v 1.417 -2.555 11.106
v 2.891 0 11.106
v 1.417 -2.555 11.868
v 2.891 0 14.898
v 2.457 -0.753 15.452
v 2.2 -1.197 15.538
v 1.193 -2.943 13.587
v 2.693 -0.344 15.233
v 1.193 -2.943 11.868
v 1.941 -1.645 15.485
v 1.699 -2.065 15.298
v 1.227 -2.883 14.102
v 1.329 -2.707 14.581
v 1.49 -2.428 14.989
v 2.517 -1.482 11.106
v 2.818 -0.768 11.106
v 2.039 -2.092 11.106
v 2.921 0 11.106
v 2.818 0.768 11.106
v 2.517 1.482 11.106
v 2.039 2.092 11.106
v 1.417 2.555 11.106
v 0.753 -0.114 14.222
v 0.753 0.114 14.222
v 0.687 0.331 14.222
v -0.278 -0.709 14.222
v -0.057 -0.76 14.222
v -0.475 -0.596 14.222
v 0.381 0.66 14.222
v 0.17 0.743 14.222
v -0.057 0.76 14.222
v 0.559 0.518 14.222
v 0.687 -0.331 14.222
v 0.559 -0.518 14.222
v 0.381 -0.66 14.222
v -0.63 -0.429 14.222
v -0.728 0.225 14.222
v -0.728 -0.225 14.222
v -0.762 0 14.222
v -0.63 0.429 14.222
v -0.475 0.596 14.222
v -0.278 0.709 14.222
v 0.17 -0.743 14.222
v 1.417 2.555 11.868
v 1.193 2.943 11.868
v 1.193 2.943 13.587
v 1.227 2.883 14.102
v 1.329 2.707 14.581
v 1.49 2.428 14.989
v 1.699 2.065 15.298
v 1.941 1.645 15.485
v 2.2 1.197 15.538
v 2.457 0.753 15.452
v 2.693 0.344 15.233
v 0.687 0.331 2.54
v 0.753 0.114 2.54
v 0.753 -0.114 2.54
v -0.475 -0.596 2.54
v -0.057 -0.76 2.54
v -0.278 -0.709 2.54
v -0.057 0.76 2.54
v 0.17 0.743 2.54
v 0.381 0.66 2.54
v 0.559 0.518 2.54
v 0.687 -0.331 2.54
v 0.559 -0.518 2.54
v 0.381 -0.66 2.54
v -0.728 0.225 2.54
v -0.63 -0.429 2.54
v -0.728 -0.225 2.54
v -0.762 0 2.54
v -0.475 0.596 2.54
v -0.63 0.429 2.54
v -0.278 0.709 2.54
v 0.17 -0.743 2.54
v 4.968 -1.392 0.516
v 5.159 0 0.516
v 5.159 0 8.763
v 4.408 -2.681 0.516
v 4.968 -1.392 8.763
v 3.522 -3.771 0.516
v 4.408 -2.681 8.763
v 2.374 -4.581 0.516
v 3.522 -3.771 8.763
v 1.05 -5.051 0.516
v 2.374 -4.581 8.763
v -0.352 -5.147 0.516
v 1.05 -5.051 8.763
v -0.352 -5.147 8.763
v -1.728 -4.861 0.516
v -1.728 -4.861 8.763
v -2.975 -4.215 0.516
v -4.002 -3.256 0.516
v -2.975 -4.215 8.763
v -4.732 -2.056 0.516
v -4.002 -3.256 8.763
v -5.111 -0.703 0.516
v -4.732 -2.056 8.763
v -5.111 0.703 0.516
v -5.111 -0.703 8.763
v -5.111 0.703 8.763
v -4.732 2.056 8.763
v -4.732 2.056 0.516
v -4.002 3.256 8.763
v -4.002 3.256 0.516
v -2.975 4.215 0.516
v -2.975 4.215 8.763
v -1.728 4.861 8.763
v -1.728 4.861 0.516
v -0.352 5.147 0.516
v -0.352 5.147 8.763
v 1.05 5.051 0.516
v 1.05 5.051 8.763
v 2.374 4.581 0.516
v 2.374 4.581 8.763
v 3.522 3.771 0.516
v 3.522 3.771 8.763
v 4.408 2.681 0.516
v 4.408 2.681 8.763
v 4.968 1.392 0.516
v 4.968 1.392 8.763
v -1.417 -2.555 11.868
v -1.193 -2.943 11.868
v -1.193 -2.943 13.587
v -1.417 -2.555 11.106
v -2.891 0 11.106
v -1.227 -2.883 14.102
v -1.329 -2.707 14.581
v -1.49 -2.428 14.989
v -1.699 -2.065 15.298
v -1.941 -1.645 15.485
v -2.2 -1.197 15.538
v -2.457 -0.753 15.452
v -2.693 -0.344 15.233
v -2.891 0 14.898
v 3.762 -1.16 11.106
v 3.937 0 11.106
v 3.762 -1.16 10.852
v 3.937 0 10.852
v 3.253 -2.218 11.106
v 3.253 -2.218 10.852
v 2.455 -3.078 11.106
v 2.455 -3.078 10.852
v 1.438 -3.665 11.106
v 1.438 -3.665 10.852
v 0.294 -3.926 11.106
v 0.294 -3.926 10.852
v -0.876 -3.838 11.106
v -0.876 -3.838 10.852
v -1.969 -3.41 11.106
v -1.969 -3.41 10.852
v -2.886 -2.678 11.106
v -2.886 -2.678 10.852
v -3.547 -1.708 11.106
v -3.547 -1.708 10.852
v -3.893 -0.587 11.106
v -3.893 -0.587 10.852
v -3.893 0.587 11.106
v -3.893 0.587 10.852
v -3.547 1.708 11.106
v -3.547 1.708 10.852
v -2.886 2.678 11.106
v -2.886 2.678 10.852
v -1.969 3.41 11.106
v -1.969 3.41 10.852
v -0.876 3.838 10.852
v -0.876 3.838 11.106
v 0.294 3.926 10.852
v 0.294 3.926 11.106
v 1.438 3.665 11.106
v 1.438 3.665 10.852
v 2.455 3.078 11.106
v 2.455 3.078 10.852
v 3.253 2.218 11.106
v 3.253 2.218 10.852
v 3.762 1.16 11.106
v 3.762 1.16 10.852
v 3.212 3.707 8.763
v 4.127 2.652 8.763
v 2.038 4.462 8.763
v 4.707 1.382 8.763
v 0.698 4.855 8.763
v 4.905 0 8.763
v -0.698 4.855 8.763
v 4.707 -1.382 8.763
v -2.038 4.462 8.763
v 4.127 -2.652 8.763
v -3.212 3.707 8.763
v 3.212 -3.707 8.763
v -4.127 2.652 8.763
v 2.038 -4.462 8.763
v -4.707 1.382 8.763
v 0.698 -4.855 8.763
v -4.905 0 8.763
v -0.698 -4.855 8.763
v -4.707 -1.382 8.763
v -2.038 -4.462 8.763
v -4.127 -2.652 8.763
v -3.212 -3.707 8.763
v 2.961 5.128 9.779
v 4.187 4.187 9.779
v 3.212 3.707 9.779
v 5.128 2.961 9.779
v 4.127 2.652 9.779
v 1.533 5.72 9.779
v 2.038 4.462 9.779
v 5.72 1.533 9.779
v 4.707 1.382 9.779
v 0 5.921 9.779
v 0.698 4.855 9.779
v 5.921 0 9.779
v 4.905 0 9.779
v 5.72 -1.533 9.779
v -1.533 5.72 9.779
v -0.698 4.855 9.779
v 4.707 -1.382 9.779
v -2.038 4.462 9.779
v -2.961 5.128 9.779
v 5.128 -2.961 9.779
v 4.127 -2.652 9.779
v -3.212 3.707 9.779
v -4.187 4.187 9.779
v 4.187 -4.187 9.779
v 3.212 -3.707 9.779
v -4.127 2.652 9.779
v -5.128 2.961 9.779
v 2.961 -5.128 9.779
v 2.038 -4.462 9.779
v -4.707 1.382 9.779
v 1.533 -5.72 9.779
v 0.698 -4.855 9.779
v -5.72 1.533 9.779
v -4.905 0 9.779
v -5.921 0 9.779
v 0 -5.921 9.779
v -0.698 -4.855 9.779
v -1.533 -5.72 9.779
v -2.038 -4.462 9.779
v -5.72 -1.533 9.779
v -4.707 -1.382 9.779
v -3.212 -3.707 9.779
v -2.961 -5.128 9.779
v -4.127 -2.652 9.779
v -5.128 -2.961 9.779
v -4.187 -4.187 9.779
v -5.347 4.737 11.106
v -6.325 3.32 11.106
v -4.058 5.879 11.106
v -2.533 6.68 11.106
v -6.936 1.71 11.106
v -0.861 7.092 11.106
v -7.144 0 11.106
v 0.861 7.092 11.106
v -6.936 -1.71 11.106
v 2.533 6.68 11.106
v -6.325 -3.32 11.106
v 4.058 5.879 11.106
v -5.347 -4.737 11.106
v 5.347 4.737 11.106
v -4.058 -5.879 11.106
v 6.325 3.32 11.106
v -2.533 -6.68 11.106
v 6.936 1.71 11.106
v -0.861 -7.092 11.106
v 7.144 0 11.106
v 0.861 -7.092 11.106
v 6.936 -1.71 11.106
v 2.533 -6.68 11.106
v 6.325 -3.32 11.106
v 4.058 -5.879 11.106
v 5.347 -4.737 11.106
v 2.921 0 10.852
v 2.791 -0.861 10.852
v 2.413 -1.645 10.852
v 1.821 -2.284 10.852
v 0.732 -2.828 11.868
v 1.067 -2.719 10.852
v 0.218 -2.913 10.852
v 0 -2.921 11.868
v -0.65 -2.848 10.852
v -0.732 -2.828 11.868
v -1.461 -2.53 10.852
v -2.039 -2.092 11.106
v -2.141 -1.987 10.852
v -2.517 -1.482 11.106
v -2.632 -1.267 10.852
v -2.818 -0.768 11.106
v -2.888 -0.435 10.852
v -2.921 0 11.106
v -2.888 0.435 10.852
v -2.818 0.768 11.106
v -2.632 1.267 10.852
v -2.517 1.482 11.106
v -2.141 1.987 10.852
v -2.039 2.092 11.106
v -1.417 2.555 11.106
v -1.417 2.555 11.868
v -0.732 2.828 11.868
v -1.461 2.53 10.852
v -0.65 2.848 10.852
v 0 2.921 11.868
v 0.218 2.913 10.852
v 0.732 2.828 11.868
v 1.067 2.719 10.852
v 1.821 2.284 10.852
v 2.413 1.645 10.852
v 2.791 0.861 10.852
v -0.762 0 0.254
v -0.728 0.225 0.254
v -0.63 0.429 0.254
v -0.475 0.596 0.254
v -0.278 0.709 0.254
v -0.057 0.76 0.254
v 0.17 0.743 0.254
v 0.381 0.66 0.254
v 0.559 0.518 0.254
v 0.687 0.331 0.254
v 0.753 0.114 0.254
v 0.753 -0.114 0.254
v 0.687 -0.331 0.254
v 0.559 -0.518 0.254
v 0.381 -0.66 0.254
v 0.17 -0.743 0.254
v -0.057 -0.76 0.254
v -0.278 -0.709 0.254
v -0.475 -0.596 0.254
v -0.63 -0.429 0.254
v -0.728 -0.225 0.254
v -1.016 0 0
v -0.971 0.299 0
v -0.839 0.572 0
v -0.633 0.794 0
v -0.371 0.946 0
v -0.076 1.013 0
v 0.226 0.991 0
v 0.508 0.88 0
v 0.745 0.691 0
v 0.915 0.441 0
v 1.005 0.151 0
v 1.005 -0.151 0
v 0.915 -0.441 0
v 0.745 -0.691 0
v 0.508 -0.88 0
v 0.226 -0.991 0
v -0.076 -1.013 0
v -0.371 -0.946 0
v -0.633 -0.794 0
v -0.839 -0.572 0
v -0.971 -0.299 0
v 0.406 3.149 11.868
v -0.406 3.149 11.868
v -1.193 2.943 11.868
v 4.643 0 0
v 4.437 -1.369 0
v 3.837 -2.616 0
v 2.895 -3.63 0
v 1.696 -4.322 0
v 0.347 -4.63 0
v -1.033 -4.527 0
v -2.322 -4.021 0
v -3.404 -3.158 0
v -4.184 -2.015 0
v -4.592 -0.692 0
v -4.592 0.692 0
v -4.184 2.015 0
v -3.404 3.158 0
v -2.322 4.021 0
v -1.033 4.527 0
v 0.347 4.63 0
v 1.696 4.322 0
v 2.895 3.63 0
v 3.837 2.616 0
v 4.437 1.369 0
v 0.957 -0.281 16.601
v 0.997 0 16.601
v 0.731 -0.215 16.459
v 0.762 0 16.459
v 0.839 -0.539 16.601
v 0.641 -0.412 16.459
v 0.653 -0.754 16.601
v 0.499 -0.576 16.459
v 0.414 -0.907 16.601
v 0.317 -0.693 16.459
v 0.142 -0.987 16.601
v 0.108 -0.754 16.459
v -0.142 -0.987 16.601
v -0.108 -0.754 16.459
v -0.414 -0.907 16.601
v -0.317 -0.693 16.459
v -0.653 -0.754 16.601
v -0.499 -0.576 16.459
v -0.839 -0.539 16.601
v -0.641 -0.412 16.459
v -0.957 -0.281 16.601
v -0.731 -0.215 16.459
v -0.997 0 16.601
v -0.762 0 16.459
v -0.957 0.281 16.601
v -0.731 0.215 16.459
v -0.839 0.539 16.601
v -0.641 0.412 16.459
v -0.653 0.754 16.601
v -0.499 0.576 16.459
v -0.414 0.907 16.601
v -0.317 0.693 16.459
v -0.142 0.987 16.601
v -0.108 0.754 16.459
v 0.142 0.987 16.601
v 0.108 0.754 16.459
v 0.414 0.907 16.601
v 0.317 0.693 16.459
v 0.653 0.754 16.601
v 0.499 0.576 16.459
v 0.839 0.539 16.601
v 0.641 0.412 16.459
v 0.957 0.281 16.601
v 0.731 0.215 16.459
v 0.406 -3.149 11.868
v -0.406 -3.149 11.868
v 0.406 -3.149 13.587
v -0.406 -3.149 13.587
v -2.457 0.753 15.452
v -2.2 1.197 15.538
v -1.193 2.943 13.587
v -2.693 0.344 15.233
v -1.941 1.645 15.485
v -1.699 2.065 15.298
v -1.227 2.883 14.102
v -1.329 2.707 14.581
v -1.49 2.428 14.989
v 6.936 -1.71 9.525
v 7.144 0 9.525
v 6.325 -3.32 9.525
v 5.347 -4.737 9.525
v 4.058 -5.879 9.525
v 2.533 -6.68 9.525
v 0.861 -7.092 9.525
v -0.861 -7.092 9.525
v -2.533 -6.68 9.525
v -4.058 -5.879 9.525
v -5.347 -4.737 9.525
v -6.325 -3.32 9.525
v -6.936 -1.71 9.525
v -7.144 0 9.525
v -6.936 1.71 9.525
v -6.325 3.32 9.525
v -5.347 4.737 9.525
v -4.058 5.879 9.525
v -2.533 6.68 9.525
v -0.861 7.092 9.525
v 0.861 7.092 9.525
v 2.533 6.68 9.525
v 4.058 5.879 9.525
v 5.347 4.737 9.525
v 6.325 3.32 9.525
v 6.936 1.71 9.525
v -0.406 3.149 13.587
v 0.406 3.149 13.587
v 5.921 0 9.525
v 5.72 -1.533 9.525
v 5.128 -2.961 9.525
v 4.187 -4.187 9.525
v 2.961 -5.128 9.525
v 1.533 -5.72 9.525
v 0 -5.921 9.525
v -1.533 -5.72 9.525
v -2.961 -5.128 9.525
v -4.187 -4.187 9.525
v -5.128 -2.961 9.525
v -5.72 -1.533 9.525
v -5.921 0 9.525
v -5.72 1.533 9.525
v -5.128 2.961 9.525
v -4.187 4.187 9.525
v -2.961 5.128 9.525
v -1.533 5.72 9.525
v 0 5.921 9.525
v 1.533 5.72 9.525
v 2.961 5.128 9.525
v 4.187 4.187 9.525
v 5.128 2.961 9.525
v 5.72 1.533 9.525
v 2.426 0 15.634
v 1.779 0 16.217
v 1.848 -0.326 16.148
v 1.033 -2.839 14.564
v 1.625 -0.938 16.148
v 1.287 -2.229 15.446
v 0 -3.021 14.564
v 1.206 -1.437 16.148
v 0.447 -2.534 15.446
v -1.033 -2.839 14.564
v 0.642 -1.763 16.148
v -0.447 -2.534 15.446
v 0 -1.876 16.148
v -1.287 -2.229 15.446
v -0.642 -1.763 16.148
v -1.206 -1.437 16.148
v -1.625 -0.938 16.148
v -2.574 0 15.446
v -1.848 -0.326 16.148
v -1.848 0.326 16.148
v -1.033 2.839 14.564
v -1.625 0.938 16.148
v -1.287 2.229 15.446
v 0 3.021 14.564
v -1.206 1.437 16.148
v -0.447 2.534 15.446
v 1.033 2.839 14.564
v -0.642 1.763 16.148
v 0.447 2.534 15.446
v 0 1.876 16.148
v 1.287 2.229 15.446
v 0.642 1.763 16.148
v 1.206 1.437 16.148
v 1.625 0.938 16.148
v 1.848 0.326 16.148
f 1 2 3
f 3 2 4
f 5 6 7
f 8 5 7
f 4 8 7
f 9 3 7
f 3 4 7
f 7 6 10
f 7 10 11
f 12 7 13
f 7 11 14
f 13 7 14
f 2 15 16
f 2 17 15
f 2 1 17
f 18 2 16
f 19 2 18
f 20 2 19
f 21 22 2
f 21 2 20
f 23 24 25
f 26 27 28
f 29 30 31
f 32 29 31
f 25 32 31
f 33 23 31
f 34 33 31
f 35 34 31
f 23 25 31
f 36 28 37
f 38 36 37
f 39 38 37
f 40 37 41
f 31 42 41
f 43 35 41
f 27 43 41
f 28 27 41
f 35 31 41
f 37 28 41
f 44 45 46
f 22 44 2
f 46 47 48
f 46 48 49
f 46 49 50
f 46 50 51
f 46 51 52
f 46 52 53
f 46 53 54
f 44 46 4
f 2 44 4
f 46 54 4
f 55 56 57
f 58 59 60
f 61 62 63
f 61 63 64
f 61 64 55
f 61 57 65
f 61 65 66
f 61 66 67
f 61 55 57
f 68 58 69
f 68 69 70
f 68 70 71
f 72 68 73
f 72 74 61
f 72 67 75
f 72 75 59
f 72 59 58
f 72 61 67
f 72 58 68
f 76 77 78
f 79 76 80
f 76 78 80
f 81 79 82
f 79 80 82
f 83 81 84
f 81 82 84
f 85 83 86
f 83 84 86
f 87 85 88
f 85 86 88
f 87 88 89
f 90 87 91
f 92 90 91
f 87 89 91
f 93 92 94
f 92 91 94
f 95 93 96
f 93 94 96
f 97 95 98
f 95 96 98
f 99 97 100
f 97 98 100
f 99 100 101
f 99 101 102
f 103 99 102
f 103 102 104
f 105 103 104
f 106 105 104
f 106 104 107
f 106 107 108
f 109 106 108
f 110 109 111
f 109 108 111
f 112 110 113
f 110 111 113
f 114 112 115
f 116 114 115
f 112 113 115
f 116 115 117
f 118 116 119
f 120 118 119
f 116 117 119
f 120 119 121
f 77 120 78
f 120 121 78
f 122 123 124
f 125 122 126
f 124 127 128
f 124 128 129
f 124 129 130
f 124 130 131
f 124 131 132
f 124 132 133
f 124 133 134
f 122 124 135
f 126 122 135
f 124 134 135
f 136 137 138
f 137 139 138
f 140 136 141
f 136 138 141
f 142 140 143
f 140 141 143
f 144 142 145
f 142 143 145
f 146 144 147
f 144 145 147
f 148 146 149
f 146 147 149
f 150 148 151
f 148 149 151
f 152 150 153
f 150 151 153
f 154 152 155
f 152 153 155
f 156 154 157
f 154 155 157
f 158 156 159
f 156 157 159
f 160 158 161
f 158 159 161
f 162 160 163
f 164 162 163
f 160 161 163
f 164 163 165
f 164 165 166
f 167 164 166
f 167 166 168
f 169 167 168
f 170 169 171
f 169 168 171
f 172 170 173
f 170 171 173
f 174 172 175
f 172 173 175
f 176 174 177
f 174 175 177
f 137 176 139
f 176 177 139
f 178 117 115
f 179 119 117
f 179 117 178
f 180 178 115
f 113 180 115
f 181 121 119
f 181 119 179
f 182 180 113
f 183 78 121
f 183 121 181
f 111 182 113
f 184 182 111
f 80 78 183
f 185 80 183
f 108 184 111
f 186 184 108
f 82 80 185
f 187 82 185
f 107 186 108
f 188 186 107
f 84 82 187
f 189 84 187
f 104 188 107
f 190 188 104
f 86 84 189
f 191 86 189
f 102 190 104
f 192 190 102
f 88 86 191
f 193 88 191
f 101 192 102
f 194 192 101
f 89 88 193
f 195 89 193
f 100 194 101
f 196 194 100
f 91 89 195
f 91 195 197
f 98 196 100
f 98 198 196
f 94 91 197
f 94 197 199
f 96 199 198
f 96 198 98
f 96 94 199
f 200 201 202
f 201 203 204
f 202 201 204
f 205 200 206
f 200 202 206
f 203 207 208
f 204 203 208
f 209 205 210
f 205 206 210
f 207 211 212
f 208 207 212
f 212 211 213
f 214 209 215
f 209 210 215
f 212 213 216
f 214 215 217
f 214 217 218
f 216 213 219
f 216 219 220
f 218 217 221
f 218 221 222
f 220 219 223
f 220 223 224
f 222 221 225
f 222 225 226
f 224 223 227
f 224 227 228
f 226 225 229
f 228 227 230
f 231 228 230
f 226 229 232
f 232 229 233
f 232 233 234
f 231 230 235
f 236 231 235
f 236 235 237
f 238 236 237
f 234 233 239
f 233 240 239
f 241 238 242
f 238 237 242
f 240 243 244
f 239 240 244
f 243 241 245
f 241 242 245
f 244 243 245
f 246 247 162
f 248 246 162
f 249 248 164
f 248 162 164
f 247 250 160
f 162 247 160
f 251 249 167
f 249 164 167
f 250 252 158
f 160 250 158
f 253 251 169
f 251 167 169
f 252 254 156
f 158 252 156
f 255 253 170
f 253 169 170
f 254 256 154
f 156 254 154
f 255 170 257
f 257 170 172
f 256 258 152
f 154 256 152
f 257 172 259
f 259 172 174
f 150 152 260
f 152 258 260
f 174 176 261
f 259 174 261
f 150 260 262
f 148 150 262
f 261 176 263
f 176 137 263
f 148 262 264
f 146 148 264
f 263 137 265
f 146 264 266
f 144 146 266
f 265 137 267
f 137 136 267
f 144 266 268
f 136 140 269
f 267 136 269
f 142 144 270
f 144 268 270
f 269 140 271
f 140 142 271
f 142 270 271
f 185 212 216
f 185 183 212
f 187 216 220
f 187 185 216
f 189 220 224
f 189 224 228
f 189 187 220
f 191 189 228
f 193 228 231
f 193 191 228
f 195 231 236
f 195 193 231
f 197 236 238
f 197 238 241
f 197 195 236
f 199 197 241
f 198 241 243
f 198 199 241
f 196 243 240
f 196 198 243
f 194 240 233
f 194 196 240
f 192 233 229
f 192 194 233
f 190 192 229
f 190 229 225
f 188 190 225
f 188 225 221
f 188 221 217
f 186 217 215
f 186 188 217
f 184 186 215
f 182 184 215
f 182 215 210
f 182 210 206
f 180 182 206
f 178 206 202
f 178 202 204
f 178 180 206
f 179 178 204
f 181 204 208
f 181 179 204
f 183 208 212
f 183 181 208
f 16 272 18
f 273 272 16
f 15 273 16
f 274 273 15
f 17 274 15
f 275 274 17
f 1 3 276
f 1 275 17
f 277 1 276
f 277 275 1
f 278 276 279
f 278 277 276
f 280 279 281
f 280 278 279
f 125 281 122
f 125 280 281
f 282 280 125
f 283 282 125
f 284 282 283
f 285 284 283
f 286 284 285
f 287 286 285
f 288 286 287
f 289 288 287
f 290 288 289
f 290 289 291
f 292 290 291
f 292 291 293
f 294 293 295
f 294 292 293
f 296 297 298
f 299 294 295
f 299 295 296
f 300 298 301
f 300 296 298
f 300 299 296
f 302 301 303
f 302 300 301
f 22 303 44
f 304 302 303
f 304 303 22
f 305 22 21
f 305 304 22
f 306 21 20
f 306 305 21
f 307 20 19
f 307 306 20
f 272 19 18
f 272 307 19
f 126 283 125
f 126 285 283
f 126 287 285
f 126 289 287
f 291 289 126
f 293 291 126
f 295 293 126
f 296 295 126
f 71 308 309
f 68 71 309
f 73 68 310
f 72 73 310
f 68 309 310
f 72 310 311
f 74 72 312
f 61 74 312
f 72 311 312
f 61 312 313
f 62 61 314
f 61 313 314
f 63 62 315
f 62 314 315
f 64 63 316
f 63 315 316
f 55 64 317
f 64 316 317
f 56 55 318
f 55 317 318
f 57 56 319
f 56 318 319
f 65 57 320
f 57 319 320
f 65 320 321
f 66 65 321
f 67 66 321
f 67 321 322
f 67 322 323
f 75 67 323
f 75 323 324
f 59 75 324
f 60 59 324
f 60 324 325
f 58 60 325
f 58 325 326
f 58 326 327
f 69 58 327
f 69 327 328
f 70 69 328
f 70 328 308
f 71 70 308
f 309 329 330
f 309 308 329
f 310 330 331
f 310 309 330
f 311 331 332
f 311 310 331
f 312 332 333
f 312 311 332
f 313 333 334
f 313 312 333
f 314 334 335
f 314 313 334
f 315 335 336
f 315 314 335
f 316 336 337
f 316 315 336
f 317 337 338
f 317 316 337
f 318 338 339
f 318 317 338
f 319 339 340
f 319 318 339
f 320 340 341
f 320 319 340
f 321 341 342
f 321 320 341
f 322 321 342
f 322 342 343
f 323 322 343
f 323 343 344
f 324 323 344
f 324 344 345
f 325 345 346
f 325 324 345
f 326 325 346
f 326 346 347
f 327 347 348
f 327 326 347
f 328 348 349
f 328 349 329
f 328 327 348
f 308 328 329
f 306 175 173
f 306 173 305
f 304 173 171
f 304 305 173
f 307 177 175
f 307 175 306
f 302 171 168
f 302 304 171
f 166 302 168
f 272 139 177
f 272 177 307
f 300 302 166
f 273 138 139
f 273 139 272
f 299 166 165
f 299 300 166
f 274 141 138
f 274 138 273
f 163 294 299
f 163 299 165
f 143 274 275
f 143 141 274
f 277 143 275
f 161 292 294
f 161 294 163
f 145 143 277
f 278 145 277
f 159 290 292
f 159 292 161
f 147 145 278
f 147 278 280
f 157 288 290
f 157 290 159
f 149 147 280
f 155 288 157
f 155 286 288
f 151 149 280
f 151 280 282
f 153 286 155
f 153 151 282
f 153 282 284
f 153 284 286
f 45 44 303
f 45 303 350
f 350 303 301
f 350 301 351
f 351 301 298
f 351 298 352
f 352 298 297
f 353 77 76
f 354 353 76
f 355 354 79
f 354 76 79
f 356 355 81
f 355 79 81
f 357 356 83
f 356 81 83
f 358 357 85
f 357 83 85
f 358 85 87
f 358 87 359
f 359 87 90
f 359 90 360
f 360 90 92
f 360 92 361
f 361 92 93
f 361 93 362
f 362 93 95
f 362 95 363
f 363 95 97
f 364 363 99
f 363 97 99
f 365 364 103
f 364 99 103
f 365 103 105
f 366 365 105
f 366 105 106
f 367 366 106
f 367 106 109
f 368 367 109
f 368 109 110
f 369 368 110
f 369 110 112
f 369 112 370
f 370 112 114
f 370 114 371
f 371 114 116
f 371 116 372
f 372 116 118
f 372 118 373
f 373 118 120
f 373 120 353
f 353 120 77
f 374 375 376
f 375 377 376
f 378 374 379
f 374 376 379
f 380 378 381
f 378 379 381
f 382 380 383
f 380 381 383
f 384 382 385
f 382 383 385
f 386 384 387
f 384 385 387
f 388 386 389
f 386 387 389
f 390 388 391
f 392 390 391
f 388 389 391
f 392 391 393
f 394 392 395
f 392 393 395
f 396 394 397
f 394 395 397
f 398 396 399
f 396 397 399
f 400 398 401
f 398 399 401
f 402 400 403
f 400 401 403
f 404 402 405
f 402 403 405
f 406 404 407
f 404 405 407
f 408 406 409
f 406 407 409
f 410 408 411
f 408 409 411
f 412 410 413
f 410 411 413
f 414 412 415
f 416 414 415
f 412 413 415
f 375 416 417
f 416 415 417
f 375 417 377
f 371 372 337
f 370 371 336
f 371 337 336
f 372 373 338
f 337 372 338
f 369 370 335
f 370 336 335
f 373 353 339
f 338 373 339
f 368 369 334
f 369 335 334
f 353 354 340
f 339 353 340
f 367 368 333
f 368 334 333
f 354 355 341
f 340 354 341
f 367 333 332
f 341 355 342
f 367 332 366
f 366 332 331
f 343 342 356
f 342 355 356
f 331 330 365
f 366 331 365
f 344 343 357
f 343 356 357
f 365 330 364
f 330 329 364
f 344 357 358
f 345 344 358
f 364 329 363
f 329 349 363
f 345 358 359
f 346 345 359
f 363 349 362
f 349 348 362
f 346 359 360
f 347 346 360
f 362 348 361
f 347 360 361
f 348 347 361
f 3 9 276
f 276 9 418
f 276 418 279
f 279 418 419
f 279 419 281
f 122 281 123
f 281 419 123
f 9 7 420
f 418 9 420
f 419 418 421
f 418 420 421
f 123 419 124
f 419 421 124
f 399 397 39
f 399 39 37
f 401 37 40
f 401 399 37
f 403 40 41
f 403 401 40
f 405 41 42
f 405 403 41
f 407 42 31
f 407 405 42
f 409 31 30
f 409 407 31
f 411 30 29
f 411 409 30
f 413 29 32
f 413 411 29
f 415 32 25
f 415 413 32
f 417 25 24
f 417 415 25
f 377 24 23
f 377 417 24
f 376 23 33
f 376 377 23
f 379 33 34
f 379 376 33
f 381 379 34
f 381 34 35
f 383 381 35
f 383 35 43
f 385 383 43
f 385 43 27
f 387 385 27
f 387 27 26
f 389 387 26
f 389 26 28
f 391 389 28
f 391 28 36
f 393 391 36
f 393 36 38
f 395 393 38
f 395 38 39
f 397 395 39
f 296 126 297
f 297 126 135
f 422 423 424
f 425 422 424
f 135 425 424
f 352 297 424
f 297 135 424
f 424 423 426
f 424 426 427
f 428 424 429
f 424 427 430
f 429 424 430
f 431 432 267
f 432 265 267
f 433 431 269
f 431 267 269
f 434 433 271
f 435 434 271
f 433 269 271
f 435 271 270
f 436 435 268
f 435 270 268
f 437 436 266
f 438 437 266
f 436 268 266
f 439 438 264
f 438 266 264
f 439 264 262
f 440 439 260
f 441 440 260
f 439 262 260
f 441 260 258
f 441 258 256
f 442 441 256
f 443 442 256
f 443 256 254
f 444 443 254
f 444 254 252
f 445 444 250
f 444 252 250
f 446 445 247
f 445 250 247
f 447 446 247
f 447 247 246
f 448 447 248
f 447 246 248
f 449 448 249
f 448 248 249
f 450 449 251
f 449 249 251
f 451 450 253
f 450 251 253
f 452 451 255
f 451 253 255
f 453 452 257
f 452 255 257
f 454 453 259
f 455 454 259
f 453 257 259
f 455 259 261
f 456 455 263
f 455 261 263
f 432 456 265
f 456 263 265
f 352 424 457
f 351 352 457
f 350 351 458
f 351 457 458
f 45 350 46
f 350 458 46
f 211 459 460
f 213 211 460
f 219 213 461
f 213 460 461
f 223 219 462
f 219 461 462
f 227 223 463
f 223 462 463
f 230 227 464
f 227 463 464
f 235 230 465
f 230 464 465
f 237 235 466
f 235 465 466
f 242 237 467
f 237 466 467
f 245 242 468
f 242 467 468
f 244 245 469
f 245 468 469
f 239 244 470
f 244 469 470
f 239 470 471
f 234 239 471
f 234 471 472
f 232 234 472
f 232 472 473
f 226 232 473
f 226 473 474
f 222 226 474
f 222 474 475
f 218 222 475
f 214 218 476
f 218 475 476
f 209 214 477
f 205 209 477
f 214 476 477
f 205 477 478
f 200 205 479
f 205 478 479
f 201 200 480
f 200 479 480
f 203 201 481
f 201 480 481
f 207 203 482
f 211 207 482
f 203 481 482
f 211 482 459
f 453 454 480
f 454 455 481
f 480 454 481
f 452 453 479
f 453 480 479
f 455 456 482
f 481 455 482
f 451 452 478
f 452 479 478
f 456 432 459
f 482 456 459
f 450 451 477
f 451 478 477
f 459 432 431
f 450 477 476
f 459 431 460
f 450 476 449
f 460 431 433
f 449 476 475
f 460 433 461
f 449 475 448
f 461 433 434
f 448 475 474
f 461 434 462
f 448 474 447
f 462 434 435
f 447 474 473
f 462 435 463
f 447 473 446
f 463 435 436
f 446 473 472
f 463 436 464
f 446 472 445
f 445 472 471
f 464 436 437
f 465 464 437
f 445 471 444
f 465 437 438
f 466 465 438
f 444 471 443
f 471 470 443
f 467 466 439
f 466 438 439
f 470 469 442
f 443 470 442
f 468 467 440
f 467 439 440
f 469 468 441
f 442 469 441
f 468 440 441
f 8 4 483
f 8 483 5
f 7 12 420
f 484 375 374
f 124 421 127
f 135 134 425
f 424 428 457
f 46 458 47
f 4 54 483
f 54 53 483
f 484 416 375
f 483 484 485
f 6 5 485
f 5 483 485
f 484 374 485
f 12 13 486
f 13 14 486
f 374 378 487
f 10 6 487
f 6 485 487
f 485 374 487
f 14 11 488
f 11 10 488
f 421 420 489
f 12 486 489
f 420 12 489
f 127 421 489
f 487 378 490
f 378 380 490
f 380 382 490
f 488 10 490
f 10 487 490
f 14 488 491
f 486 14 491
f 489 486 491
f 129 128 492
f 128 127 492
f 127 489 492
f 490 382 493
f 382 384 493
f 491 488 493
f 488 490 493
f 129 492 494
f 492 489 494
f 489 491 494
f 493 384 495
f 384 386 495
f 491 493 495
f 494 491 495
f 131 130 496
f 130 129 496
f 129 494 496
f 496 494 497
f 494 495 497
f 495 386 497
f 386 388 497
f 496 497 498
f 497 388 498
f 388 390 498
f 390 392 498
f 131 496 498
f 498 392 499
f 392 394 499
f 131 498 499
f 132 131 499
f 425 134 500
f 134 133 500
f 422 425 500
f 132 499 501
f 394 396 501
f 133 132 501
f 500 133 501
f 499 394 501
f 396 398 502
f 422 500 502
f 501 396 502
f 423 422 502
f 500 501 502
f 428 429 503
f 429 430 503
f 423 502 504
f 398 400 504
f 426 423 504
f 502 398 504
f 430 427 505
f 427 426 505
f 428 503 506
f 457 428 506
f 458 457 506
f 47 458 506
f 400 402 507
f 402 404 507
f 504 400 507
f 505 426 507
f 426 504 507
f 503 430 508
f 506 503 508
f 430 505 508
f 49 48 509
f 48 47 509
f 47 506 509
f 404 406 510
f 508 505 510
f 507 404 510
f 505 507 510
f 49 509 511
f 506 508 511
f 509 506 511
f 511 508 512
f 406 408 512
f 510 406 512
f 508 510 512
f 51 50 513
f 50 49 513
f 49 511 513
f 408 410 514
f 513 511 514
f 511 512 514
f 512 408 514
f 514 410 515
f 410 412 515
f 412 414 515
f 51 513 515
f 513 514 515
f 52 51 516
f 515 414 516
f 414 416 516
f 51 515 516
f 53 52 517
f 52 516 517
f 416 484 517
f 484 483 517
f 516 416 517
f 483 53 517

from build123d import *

# Parameters (mm, degrees)
SKETCH3_W          = 1.016
SKETCH3_H          = 1.016
CHAMFER1_SIZE      = 0.5159375
SKETCH2_R          = 0.762
CUT_EXTRUDE1_DEPTH = 2.54
CHAMFER2_SIZE      = 0.254
CHAMFER2_SIZE_2    = 0.209783356
SKETCH4_OUTSIDE_W  = 21.518
SKETCH4_OUTSIDE_H  = 21.518
CUT_EXTRUDE2_DEPTH = 5.655396081


with BuildPart() as part:
    # Sketch1 → Revolve1 (revolve)
    with BuildSketch(Plane(origin=(0, 0, 0), x_dir=(0, 0, -1), z_dir=(1, 0, 0)), mode=Mode.PRIVATE) as revolve1_sk:
        with BuildLine():
            Line((0, 0), (0, 5.159375))
            Line((0, 5.159375), (-9.525, 5.159375))
            Line((-9.525, 5.159375), (-9.525, 7.14375))
            Line((-9.525, 7.14375), (-11.10615, 7.14375))
            Line((-11.10615, 7.14375), (-11.10615, 3.175))
            Line((-11.10615, 3.175), (-13.586546081, 3.175))
            ThreePointArc((-13.586546081, 3.175), (-15.831610111, 2.24506403), (-16.761546081, 0))
            Line((-16.761546081, 0), (0, 0))
        make_face()
    revolve(revolve1_sk.sketch.rotate(Axis((0, 0, 17.33350529), (0, 0, -1)), 90), axis=Axis((0, 0, 17.33350529), (0, 0, -1)))

    # Sketch3 → Cut-Revolve1 (revolve, cut)
    with BuildSketch(Plane(origin=(0, 0, 0), x_dir=(0, 0, -1), z_dir=(1, 0, 0)), mode=Mode.PRIVATE) as cut_revolve1_sk:
        with Locations((-11.36015, 3.429)):
            Rectangle(SKETCH3_W, SKETCH3_H)
        with Locations((-9.271, 5.413375)):
            Rectangle(SKETCH3_W, SKETCH3_H)
    revolve(cut_revolve1_sk.sketch.rotate(Axis((0, 0, 17.33350529), (0, 0, -1)), 90), axis=Axis((0, 0, 17.33350529), (0, 0, -1)), mode=Mode.SUBTRACT)

    # Chamfer1
    chamfer1_edges = [part.edges().sort_by_distance(p)[0] for p in [
        (-5.159375, 0, 0),
    ]]
    chamfer(chamfer1_edges, length=CHAMFER1_SIZE)

    # Sketch2 → Cut-Extrude1 (cut)
    with BuildSketch(Plane(origin=(0, 0, 0), x_dir=(-1, 0, 0), z_dir=(0, 0, -1))):
        Circle(SKETCH2_R)
    cut_extrude1 = extrude(amount=-CUT_EXTRUDE1_DEPTH, mode=Mode.SUBTRACT)

    # Mirror1: Cut-Extrude1 across plane
    add(cut_extrude1.mirror(Plane.XY.offset(8.38077304)), mode=Mode.SUBTRACT)

    # Chamfer2
    # the kernel refuses this chamfer: 0.254, 0.209783356 mm, written as the material it takes off along each edge
    with BuildSketch(Plane(origin=(0, 0, 0), x_dir=(-1, 0, 0), z_dir=(0, -1, 0))) as chamfer2_piece_1:
        Polygon((0.762 + CHAMFER2_SIZE, 0), (0.762, -CHAMFER2_SIZE), (0.762, 0), align=None)
    revolve(axis=Axis((0, 0, 0), (0, 0, -1)), mode=Mode.SUBTRACT)
    with BuildSketch(Plane(origin=(1e-09, -1e-09, 16.66875), x_dir=(1.0, 1.2724919857814273e-09, -4.6623539153921465e-15), z_dir=(-1.2724919857814273e-09, 1.0, 2.691811803016297e-15))) as chamfer2_piece_2:
        with BuildLine():
            Line((0.997154657, 0.067853643), (0.761999999, CHAMFER2_SIZE_2))
            Line((0.761999999, CHAMFER2_SIZE_2), (0.761999999, 0))
            ThreePointArc((0.761999999, 0), (0.883545151, 0.032618216), (0.997154657, 0.067853643))
        make_face()
    revolve(axis=Axis((1e-09, -1e-09, 16.66875), (0, 0, -1)), revolution_arc=180.000000146, mode=Mode.SUBTRACT)
    with BuildSketch(Plane(origin=(1e-09, 1e-09, 16.66875), x_dir=(-1.0, -1.0948837603327353e-09, 4.6623539045804394e-15), z_dir=(1.0948837603327353e-09, -1.0, -8.075425709502658e-15))) as chamfer2_piece_3:
        with BuildLine():
            Line((0.997154658, 0.067853643), (0.761999999, 0.209783357))
            Line((0.761999999, 0.209783357), (0.762000001, 0))
            ThreePointArc((0.762000001, 0), (0.883545153, 0.032618216), (0.997154658, 0.067853643))
        make_face()
    revolve(axis=Axis((1e-09, 1e-09, 16.66875), (0, 0, -1)), revolution_arc=180.000000125, mode=Mode.SUBTRACT)

    # Sketch4 outside → Cut-Extrude2 (cut)
    with BuildSketch(Plane.XY.offset(16.761546081)):
        Rectangle(SKETCH4_OUTSIDE_W, SKETCH4_OUTSIDE_H)
        Polygon((-2.891420438, 0), (-1.058333333, 3.175), (1.058333333, 3.175), (2.891420438, 0), (1.058333333, -3.175), (-1.058333333, -3.175), align=None, mode=Mode.SUBTRACT)
    extrude(amount=-CUT_EXTRUDE2_DEPTH, mode=Mode.SUBTRACT)


solid = part.part
